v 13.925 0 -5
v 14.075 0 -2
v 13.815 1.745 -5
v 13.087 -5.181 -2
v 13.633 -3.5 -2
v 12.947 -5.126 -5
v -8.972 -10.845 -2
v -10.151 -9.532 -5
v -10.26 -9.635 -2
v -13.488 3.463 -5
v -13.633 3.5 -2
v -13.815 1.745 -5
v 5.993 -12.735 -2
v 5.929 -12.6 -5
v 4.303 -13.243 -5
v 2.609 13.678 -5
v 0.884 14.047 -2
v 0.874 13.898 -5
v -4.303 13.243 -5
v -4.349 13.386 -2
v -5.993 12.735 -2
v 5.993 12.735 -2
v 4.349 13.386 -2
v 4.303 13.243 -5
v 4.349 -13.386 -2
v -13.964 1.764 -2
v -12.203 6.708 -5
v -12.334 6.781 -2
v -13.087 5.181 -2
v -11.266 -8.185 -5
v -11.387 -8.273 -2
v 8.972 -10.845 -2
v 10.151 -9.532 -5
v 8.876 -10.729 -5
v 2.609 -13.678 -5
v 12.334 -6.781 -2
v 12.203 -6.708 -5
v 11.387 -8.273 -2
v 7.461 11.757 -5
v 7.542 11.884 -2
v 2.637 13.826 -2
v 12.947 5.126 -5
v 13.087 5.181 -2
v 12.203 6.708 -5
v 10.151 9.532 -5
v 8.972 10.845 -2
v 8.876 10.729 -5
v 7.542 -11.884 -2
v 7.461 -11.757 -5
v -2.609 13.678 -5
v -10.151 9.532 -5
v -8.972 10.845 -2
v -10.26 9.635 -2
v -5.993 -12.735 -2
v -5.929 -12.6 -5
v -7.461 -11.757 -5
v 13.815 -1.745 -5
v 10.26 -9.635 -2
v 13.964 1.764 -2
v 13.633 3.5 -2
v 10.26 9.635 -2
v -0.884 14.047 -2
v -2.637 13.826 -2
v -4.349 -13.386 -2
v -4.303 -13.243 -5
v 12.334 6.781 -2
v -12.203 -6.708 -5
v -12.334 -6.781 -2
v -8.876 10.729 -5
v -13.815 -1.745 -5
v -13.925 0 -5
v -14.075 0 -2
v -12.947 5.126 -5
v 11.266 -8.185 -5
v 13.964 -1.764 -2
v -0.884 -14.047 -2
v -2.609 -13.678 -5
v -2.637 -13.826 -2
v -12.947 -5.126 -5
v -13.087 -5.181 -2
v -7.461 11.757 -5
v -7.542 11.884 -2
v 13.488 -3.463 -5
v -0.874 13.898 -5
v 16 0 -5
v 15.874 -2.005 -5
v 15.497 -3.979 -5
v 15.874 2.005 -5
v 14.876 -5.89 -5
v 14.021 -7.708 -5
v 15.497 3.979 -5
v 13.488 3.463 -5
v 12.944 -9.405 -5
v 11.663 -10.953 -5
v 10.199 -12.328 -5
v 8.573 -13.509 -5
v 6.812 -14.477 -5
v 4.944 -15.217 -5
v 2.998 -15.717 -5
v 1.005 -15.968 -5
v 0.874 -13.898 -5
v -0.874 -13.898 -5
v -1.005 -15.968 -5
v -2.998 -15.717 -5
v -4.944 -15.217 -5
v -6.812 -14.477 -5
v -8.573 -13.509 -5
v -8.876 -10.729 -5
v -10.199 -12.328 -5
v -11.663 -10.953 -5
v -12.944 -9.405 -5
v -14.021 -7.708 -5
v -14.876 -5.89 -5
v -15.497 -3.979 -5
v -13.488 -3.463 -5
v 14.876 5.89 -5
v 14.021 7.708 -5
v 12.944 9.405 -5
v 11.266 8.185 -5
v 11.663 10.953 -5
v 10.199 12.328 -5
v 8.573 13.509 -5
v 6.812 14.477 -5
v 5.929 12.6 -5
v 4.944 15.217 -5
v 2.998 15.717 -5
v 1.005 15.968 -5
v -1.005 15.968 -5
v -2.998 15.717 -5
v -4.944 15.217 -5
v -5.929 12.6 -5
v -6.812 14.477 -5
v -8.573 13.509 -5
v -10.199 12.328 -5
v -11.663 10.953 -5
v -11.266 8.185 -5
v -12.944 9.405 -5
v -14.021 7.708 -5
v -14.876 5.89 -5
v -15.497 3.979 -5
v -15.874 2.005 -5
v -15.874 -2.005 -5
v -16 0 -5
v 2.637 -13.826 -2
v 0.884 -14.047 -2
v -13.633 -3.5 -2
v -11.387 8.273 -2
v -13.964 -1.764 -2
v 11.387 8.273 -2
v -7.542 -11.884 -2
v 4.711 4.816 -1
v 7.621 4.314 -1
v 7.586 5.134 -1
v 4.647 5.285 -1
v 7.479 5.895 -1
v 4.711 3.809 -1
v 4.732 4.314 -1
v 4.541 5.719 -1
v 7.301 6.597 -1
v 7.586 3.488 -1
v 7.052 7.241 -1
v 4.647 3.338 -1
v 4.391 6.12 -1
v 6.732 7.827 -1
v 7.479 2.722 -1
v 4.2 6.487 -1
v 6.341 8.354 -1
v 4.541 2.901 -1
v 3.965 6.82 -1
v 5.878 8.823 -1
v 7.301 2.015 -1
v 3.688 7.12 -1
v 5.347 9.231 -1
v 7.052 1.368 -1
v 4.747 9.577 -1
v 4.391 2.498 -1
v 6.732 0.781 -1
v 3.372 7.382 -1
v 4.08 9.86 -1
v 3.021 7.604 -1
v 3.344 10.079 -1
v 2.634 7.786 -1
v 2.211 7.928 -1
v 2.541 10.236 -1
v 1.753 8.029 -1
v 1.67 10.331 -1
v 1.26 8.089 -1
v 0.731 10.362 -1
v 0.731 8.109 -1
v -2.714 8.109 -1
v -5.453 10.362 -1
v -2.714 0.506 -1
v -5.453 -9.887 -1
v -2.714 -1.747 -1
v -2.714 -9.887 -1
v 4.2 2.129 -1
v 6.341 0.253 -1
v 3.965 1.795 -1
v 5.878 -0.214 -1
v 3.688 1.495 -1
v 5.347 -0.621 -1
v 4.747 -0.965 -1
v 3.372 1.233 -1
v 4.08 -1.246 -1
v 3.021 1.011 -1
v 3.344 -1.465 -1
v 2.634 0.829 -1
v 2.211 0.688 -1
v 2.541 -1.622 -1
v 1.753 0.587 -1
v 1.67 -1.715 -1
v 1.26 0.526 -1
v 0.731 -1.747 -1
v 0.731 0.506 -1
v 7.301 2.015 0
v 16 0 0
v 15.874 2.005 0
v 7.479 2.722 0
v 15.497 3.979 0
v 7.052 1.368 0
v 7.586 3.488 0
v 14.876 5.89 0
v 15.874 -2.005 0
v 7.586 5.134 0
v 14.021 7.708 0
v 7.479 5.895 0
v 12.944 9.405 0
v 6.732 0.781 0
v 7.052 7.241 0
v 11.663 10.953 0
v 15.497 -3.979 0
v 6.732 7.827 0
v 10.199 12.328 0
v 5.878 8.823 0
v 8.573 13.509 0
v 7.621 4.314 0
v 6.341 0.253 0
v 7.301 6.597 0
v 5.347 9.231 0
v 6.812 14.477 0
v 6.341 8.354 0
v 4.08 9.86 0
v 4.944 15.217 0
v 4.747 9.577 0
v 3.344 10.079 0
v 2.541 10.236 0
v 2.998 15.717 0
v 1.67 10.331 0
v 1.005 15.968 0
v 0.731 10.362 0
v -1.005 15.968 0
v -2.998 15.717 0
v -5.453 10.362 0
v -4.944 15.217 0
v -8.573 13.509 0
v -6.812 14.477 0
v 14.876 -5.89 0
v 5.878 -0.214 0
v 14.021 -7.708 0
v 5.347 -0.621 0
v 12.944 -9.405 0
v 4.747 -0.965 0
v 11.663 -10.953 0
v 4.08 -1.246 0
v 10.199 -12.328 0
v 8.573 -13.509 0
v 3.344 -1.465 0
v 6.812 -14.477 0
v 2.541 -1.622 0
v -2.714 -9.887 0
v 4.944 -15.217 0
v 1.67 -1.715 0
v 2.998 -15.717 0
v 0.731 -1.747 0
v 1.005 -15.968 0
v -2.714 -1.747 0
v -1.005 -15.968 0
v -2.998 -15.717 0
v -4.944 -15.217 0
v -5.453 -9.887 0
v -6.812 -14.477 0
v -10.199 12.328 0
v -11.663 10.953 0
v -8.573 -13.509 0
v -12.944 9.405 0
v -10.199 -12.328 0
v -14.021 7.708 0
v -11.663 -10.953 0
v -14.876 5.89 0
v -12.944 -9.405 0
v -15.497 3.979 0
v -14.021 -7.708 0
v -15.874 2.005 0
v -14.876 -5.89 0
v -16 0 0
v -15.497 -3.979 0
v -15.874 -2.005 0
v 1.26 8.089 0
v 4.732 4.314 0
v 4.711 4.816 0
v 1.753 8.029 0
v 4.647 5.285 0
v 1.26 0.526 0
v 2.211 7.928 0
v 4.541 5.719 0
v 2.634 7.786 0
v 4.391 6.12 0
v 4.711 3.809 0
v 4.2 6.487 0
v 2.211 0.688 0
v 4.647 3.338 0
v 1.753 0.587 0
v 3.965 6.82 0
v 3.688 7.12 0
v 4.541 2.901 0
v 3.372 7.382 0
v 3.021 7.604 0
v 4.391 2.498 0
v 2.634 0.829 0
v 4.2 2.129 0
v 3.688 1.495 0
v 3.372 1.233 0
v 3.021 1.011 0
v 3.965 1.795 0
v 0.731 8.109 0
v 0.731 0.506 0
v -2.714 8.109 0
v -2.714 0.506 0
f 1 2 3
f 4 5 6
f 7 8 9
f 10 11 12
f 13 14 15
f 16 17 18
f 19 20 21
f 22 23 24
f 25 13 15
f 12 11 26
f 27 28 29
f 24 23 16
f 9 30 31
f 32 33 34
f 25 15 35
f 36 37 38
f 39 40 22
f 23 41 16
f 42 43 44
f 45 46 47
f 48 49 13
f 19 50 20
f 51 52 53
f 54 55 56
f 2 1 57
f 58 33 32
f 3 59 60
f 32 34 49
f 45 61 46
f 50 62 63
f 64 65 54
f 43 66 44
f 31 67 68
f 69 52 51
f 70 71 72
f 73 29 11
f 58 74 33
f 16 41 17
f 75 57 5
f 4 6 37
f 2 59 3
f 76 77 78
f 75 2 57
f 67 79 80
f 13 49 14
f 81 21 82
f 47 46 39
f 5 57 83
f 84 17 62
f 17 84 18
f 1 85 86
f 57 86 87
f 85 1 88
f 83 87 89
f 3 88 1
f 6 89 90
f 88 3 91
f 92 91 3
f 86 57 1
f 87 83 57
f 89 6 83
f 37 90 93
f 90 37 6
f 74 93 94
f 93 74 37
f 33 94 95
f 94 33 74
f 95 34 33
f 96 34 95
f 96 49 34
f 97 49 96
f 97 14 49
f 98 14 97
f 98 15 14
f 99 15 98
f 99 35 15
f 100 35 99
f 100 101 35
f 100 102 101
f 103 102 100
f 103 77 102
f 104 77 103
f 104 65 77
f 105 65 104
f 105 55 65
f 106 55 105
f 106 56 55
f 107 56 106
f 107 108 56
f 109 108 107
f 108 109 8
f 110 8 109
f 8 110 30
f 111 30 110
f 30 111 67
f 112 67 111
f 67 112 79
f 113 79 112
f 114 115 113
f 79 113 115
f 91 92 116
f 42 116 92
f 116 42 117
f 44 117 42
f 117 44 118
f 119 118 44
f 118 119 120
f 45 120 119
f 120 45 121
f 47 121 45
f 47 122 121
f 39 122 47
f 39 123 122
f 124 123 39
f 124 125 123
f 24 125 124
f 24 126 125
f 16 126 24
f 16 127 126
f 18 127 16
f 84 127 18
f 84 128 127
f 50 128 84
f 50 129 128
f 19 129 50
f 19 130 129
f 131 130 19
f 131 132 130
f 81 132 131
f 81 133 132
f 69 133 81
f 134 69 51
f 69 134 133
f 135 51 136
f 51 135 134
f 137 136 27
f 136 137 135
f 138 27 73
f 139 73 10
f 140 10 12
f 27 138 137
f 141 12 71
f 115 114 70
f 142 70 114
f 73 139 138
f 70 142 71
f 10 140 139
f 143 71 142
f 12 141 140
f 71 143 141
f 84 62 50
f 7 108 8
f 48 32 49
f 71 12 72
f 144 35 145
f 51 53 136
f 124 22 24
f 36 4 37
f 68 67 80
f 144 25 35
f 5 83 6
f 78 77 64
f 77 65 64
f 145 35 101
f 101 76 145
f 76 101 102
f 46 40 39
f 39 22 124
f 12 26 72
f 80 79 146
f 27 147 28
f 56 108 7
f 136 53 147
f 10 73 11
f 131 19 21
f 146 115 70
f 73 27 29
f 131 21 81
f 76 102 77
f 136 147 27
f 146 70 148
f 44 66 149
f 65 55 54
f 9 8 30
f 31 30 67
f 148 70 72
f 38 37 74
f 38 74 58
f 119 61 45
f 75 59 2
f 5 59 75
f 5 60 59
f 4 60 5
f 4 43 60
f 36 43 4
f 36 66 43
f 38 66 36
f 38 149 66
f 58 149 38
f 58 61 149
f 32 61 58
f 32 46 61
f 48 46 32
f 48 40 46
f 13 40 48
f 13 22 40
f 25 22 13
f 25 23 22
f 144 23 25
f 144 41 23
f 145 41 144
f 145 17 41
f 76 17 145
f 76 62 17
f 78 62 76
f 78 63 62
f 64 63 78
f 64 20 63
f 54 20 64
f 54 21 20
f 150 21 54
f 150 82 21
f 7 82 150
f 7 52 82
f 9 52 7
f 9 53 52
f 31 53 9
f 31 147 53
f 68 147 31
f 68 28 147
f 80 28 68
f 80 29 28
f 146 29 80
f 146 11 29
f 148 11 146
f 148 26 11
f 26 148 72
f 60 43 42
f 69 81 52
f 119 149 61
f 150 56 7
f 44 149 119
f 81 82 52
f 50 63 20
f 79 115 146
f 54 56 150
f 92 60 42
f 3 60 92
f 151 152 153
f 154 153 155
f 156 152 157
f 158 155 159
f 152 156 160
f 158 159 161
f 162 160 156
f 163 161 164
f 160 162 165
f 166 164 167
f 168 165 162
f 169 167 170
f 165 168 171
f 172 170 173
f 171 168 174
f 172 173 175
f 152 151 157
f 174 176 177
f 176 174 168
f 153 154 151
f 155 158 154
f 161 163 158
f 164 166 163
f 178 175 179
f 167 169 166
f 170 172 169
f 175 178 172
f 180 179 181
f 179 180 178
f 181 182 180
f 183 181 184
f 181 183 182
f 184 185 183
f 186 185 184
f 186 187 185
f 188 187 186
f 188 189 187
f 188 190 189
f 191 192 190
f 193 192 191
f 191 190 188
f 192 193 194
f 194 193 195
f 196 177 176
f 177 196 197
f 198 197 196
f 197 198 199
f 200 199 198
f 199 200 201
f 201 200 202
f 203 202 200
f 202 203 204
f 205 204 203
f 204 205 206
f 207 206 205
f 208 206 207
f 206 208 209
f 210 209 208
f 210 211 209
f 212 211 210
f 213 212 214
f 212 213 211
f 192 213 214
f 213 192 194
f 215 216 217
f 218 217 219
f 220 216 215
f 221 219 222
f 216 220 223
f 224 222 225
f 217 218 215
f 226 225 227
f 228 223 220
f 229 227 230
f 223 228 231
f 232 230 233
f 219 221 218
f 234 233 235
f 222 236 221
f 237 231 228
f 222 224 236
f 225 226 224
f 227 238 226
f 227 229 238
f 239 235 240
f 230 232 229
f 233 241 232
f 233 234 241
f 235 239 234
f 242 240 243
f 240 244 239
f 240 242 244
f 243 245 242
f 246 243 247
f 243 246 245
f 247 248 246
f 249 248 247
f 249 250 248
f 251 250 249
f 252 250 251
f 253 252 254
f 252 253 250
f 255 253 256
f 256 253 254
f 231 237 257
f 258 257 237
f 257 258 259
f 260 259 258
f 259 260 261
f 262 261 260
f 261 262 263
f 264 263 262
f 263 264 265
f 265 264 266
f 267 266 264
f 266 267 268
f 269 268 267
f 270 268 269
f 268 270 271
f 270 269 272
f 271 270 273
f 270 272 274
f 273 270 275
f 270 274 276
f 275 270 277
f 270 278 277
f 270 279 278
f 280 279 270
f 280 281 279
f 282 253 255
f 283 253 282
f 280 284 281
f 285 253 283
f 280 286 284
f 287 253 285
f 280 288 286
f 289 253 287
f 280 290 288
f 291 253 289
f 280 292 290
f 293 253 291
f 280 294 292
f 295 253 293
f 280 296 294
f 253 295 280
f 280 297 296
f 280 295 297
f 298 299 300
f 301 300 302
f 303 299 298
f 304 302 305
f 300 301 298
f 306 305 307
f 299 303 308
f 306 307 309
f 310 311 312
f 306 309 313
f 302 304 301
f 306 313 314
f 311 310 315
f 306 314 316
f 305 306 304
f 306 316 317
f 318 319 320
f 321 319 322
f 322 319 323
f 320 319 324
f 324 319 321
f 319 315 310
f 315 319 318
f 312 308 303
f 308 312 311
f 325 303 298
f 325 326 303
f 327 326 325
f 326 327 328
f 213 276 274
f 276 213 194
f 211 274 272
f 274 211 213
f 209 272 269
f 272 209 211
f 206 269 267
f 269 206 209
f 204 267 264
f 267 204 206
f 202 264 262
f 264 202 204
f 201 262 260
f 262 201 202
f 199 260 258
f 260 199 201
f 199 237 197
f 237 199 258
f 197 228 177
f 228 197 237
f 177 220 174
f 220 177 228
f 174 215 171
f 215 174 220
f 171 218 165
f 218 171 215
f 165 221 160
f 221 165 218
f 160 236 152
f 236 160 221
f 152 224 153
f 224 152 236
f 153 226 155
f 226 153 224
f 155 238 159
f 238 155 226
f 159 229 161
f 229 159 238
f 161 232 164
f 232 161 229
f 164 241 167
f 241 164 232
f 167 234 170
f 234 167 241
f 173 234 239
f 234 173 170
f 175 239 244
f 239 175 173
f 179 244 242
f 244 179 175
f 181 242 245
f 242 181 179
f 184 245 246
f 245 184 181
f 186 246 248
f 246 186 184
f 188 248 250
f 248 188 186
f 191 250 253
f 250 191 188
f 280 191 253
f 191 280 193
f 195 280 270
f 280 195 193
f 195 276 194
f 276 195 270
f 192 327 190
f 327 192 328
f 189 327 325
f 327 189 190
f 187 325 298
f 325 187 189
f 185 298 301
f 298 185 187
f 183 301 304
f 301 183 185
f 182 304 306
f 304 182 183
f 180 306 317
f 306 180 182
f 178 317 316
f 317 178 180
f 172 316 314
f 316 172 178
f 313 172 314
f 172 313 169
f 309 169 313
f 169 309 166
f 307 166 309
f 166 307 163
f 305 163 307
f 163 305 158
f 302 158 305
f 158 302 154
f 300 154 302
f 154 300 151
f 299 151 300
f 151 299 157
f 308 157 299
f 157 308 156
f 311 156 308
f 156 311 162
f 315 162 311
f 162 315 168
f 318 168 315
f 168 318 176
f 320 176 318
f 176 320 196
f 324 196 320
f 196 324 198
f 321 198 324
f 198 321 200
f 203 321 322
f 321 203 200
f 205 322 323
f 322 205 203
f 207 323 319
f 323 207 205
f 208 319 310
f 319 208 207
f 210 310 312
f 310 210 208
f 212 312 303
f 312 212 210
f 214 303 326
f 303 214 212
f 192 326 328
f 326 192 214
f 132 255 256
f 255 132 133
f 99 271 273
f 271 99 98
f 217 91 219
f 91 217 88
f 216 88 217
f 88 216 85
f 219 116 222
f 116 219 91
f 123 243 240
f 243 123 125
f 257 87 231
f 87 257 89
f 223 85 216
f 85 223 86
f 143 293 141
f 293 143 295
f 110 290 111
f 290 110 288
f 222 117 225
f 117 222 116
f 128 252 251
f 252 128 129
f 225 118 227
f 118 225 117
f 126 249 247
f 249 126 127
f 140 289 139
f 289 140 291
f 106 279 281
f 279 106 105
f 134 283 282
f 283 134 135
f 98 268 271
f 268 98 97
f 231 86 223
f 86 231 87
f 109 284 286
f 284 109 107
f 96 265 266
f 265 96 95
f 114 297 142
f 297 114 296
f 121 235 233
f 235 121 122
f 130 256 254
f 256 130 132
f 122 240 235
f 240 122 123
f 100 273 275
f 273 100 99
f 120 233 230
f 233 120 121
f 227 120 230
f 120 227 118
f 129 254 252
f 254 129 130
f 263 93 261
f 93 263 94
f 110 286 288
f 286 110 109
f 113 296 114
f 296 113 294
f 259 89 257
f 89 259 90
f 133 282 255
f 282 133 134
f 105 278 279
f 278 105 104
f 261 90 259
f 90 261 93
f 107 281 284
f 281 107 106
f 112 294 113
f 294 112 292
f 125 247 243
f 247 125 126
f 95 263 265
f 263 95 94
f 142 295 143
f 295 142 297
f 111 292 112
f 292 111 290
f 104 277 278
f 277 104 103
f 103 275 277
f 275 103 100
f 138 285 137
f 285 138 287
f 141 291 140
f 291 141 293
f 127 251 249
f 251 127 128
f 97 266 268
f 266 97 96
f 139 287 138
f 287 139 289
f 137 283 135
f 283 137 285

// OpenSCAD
$fn = 50;


difference() {
	union() {
		translate(v = [0, 0, -5.0000000000]) {
			cylinder(h = 5, r = 16.0000000000);
		}
	}
	union() {
		#translate(v = [0, 0, -5.0000000000]) {
			cylinder(h = 3, r1 = 13.9250000000, r2 = 14.0750000000);
		}
		translate(v = [0, 0, -1]) {
			linear_extrude(height = 1) {
				text(font = "Impact", halign = "center", size = 20, text = "P", valign = "center");
			}
		}
	}
}
